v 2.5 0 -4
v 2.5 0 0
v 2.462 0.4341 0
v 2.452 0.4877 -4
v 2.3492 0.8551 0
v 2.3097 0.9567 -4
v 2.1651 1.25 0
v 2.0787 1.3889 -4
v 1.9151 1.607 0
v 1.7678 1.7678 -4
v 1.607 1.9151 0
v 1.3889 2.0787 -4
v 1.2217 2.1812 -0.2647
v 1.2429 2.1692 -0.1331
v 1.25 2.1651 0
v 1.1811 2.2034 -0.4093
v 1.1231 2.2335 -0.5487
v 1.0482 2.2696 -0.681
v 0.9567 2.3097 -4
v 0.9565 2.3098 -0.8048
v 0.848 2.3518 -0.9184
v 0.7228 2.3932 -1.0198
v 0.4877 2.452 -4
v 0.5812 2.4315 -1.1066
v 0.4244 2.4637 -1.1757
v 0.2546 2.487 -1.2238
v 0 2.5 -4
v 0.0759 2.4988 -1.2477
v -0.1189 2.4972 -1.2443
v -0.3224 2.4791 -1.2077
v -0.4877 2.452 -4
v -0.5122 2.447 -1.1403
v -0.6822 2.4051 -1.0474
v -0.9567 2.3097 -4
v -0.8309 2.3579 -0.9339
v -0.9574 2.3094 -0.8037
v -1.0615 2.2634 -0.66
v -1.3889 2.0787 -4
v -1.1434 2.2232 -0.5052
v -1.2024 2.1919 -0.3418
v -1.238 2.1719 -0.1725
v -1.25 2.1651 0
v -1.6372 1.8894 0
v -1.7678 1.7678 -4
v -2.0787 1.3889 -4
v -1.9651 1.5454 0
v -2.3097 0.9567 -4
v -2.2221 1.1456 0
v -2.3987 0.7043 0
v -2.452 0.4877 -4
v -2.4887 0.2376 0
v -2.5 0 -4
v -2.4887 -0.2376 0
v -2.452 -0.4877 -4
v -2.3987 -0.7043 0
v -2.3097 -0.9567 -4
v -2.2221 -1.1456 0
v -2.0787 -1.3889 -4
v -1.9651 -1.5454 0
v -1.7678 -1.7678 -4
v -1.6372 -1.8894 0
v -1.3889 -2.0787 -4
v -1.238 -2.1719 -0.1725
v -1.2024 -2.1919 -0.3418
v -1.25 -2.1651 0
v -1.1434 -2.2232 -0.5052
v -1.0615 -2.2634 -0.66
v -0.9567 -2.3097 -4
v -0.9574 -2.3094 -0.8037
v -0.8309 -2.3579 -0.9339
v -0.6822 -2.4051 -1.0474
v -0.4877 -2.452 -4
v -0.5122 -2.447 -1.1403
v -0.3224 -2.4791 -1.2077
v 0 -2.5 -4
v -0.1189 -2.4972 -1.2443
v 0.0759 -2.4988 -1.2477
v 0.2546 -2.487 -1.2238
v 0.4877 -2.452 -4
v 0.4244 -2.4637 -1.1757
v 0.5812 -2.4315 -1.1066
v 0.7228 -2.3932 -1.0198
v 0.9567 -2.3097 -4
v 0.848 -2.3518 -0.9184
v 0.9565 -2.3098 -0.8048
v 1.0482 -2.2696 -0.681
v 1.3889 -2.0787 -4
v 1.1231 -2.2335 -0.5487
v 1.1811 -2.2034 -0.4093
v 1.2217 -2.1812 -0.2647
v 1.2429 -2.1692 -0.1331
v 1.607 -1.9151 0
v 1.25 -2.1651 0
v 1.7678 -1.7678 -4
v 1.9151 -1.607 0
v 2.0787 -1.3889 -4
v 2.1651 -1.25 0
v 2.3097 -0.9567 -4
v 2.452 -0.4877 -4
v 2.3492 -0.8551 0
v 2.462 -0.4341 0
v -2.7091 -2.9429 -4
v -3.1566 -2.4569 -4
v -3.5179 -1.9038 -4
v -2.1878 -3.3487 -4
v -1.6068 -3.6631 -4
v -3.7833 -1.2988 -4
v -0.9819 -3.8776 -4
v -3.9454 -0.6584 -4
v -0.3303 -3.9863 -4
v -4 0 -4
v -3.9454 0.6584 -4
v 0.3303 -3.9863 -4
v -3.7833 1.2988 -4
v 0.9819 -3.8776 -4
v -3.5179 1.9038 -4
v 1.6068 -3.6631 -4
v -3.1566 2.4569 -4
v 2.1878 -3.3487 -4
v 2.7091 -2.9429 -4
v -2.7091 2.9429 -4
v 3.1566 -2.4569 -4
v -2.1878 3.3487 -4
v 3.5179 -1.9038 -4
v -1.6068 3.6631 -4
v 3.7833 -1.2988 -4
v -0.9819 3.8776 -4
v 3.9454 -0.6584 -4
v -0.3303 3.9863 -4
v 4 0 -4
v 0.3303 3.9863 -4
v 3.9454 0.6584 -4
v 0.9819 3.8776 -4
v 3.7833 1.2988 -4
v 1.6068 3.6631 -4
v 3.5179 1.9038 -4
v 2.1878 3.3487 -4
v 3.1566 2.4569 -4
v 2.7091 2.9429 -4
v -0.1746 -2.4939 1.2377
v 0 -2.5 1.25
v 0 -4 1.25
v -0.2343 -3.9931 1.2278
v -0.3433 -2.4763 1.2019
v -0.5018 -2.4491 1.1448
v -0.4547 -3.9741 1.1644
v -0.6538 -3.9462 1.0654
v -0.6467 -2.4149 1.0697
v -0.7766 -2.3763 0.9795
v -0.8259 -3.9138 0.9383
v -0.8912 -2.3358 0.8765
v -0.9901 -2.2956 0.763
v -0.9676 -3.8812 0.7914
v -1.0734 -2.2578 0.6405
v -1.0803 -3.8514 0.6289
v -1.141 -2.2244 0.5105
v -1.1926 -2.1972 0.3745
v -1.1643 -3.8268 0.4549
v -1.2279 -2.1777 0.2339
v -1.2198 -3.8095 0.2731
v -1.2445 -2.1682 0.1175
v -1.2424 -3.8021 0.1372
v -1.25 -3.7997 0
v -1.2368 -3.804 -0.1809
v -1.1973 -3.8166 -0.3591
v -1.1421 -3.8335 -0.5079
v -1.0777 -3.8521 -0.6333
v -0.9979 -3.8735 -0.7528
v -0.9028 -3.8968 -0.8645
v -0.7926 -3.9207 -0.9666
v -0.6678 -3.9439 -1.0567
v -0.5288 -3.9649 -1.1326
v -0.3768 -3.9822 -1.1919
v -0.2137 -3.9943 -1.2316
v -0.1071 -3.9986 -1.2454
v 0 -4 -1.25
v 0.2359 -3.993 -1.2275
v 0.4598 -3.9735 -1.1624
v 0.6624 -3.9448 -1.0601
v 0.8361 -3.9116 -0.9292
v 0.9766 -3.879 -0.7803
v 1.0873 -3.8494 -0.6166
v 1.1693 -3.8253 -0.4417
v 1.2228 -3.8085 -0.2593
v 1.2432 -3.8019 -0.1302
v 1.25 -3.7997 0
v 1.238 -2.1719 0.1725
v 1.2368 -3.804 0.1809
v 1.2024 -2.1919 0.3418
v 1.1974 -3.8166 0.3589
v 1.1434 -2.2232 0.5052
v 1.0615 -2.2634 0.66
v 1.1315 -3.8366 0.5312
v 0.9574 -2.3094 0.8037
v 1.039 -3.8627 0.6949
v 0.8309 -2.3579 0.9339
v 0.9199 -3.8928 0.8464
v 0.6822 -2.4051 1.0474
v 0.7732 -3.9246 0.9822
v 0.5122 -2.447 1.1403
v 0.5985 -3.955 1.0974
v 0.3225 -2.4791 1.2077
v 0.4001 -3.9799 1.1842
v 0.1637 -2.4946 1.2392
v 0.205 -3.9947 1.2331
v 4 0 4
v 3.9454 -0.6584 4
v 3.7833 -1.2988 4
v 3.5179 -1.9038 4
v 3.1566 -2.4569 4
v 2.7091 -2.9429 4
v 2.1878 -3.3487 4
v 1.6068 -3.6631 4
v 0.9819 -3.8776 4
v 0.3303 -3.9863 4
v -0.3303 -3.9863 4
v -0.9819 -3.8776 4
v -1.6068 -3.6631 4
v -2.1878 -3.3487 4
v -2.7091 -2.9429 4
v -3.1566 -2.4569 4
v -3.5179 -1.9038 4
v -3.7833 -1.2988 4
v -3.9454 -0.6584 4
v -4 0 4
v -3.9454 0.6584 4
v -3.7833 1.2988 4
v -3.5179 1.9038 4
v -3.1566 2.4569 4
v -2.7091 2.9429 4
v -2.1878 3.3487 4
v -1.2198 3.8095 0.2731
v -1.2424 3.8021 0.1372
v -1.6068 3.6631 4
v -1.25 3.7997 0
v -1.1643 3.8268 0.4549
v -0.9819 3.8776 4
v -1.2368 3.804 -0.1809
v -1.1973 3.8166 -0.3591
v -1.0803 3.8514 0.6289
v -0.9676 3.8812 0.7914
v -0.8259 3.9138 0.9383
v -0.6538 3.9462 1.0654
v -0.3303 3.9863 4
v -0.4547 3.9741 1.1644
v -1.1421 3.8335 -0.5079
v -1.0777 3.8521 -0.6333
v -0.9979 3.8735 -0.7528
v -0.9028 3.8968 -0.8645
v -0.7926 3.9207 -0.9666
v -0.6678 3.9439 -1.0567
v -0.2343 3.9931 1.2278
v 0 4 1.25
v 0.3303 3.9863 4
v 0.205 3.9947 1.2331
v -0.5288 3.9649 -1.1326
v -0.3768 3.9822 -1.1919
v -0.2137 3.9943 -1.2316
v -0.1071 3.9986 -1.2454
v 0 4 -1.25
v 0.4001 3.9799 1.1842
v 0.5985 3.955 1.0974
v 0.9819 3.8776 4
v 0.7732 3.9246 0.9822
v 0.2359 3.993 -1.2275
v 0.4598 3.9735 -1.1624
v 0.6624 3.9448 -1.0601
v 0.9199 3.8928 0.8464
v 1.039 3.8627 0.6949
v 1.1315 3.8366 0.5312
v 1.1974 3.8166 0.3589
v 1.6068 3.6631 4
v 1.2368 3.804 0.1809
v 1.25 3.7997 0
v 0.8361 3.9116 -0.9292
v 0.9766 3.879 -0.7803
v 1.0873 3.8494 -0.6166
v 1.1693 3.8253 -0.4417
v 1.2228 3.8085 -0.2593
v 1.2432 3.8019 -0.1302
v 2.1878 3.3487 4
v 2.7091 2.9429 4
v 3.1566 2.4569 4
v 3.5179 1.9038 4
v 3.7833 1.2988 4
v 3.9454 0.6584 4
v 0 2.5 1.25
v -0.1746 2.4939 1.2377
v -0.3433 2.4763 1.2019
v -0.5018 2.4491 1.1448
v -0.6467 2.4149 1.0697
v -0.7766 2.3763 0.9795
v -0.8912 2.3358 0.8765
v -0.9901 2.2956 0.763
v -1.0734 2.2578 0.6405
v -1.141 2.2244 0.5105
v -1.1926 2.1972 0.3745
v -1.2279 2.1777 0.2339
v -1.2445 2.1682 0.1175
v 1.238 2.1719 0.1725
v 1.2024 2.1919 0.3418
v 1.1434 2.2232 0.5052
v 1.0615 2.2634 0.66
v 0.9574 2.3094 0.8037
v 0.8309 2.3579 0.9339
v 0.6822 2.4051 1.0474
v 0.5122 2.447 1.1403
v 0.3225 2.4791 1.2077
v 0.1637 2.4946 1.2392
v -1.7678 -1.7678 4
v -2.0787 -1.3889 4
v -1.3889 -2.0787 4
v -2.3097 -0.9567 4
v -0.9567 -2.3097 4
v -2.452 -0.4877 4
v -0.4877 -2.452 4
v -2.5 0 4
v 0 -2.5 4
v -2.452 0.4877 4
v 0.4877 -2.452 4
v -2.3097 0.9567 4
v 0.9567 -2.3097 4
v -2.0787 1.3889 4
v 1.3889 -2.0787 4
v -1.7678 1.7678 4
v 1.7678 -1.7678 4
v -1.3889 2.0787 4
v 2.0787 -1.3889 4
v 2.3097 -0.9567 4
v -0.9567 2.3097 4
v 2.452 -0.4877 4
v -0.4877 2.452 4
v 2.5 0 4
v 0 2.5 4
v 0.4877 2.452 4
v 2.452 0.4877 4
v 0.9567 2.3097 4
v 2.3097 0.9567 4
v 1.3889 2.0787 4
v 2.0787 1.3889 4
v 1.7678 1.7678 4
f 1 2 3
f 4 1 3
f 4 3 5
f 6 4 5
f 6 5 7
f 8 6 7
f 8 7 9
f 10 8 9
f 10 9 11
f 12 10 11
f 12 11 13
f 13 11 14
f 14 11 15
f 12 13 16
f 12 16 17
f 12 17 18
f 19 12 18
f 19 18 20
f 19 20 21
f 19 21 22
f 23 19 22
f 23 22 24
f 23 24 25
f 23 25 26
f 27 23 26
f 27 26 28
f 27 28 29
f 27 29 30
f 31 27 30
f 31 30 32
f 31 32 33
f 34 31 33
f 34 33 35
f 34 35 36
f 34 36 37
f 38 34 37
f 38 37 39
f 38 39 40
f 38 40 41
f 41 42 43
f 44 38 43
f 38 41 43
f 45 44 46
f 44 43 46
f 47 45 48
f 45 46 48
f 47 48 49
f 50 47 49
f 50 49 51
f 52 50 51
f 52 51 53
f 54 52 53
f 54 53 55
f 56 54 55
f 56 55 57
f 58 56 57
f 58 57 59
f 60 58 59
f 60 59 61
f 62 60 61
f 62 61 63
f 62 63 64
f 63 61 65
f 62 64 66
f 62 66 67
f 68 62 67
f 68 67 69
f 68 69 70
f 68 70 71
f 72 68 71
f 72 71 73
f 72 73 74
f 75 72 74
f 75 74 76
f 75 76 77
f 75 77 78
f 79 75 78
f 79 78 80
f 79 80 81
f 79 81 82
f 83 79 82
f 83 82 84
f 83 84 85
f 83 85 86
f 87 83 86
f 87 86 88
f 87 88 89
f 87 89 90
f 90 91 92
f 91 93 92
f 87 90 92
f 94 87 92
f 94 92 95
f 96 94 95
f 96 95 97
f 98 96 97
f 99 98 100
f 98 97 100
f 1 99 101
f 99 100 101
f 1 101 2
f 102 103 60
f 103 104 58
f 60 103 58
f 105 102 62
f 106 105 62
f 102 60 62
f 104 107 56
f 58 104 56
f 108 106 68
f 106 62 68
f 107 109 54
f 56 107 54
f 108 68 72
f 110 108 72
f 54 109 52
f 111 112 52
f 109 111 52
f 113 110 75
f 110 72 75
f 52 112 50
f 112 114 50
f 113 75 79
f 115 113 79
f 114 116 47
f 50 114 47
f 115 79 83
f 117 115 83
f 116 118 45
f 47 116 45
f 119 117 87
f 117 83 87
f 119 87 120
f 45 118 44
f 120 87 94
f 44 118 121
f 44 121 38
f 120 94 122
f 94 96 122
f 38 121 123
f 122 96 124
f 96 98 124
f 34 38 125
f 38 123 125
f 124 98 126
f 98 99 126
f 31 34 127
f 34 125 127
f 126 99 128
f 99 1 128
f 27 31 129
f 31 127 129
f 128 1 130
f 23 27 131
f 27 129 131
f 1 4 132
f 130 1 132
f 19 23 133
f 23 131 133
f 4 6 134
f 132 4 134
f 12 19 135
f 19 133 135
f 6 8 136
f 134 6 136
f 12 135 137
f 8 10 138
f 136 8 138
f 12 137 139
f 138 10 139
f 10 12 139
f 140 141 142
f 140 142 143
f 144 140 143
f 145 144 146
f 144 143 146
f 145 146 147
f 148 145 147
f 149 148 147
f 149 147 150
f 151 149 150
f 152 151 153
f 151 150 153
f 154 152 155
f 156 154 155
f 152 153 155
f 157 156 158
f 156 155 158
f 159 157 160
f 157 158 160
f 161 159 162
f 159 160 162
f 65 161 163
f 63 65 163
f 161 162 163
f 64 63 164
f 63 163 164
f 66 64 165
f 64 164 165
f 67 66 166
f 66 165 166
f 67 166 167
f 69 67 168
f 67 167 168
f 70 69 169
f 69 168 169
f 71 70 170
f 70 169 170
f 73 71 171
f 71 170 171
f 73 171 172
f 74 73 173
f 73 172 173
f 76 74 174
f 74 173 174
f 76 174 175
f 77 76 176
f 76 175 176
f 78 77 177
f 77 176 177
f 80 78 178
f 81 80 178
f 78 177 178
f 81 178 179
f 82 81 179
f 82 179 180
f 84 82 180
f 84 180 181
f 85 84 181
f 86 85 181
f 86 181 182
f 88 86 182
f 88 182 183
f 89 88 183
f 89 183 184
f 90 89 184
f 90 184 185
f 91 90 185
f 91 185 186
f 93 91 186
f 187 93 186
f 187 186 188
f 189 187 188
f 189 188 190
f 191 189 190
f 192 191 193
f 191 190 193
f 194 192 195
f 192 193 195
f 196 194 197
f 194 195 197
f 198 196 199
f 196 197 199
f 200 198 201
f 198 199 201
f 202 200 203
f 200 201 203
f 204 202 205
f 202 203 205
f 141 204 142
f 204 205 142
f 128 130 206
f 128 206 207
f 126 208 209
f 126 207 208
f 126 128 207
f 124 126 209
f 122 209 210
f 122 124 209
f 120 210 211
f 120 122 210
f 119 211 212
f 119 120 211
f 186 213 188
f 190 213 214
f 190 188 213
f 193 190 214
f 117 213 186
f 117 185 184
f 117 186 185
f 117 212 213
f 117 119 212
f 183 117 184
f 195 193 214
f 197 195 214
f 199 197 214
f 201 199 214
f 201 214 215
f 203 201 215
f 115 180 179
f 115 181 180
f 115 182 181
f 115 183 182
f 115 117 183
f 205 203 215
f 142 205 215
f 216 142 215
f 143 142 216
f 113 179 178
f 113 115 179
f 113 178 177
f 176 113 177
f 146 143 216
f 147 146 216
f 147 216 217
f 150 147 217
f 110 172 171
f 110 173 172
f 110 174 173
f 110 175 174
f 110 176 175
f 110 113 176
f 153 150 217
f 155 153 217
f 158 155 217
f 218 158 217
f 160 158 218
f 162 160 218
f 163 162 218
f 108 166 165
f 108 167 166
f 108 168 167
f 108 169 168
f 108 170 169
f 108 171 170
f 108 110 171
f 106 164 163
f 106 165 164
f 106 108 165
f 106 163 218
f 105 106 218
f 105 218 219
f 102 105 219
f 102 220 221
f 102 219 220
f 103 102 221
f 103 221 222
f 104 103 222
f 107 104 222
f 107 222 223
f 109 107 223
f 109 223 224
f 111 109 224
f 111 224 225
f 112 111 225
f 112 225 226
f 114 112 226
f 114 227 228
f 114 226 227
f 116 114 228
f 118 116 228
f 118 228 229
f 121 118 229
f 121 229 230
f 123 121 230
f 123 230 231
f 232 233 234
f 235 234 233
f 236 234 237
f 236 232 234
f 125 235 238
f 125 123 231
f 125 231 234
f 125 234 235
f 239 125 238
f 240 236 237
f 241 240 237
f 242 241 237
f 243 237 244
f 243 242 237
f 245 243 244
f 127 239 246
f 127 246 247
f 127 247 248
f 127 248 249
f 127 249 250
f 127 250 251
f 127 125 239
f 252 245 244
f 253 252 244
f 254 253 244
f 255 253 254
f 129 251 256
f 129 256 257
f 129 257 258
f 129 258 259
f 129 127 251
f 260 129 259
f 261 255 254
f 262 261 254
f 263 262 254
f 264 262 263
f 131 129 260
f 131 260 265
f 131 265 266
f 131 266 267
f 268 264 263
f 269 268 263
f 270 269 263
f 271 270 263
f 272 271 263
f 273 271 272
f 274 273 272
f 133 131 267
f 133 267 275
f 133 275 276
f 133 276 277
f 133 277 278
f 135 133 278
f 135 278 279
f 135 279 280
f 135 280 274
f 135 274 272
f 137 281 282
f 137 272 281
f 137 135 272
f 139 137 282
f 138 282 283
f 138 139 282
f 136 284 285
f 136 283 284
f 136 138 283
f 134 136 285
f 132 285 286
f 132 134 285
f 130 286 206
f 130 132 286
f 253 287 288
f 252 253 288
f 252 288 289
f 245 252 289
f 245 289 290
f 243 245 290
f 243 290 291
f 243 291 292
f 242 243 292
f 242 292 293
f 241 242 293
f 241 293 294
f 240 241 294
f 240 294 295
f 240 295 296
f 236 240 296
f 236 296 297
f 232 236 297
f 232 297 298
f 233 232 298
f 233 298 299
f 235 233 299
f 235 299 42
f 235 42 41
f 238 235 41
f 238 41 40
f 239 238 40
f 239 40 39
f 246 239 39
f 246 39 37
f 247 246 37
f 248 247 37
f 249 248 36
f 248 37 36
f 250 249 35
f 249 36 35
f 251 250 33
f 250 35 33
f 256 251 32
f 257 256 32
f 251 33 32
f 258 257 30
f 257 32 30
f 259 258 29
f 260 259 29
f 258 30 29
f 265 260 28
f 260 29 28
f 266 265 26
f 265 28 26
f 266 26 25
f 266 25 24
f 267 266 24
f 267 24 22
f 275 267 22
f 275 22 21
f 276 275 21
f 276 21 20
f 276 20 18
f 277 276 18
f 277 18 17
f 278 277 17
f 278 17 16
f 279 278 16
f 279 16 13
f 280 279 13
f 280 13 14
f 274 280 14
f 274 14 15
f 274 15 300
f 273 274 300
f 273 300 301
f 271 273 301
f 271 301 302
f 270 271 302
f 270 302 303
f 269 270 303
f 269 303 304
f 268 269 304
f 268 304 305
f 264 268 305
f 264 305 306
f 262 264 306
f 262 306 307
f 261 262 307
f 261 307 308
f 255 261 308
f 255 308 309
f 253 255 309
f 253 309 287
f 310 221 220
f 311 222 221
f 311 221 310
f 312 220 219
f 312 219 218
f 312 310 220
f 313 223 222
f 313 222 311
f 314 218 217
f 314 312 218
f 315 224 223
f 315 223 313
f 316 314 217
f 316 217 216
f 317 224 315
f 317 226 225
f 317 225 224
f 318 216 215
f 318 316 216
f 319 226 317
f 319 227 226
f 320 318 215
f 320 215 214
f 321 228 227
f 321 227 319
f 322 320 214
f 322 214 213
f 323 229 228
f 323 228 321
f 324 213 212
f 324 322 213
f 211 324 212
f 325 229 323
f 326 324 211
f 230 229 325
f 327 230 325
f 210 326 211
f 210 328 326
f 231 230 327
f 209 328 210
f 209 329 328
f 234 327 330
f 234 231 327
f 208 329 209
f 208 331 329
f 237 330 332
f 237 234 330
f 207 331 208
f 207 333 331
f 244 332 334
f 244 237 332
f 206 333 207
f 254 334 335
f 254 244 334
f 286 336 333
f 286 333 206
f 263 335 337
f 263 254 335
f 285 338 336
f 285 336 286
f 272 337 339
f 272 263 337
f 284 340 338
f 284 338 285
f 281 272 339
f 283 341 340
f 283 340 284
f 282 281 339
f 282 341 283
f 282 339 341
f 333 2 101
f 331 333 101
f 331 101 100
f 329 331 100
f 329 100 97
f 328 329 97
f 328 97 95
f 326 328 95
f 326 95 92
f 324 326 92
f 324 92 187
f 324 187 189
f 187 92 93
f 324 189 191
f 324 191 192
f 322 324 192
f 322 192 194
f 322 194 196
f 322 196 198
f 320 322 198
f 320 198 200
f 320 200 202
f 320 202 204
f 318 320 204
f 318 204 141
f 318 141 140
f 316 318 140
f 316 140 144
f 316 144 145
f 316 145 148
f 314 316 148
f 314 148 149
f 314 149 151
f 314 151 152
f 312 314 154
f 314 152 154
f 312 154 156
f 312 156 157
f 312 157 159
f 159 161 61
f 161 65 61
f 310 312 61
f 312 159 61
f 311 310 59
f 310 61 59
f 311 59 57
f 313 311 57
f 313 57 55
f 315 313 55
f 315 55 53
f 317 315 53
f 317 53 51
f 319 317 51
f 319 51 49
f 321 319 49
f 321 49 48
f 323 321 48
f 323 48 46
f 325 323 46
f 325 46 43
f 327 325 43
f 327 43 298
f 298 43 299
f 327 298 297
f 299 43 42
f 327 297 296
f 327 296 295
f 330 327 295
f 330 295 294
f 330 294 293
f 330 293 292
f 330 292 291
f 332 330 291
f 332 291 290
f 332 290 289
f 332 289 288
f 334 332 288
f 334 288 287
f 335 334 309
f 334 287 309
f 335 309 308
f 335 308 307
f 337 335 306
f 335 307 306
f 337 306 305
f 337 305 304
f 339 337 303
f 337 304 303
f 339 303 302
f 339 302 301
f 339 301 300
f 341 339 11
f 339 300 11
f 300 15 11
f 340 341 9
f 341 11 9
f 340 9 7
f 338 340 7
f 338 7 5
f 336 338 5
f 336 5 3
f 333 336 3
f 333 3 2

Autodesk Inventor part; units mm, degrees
ref_plane "YZ Plane" through (0, 0, 0) normal (1, 0, 0) x (0, 1, 0)
ref_plane "XY Plane" through (0, 0, 0) normal (0, 0, 1) x (1, 0, 0)
sketch "Sketch1" plane through (0, 0, 0) normal (0, 0, 1) x (1, 0, 0)
  circle A0 centre (0, 0) radius 4
  circle A1 centre (0, 0) radius 2.5
  dimension "d0" = 8
  dimension "d1" = 5
extrude "Extrusion1" add sketch "Sketch1" along normal mid plane 8
ref_plane "Work Plane1" through (0, 4, 0) normal (0, 1, 0) x (-1, 0, 0)
sketch "Sketch2" plane through (0, 4, 0) normal (0, 1, 0) x (-1, 0, 0)
  point P0 (0, 0)
  point P1 (0, 0)
hole "Hole1" at (0, 4, 0) direction (0, -1, 0) diameter 2.5 depth 8
properties part number "10.1"
